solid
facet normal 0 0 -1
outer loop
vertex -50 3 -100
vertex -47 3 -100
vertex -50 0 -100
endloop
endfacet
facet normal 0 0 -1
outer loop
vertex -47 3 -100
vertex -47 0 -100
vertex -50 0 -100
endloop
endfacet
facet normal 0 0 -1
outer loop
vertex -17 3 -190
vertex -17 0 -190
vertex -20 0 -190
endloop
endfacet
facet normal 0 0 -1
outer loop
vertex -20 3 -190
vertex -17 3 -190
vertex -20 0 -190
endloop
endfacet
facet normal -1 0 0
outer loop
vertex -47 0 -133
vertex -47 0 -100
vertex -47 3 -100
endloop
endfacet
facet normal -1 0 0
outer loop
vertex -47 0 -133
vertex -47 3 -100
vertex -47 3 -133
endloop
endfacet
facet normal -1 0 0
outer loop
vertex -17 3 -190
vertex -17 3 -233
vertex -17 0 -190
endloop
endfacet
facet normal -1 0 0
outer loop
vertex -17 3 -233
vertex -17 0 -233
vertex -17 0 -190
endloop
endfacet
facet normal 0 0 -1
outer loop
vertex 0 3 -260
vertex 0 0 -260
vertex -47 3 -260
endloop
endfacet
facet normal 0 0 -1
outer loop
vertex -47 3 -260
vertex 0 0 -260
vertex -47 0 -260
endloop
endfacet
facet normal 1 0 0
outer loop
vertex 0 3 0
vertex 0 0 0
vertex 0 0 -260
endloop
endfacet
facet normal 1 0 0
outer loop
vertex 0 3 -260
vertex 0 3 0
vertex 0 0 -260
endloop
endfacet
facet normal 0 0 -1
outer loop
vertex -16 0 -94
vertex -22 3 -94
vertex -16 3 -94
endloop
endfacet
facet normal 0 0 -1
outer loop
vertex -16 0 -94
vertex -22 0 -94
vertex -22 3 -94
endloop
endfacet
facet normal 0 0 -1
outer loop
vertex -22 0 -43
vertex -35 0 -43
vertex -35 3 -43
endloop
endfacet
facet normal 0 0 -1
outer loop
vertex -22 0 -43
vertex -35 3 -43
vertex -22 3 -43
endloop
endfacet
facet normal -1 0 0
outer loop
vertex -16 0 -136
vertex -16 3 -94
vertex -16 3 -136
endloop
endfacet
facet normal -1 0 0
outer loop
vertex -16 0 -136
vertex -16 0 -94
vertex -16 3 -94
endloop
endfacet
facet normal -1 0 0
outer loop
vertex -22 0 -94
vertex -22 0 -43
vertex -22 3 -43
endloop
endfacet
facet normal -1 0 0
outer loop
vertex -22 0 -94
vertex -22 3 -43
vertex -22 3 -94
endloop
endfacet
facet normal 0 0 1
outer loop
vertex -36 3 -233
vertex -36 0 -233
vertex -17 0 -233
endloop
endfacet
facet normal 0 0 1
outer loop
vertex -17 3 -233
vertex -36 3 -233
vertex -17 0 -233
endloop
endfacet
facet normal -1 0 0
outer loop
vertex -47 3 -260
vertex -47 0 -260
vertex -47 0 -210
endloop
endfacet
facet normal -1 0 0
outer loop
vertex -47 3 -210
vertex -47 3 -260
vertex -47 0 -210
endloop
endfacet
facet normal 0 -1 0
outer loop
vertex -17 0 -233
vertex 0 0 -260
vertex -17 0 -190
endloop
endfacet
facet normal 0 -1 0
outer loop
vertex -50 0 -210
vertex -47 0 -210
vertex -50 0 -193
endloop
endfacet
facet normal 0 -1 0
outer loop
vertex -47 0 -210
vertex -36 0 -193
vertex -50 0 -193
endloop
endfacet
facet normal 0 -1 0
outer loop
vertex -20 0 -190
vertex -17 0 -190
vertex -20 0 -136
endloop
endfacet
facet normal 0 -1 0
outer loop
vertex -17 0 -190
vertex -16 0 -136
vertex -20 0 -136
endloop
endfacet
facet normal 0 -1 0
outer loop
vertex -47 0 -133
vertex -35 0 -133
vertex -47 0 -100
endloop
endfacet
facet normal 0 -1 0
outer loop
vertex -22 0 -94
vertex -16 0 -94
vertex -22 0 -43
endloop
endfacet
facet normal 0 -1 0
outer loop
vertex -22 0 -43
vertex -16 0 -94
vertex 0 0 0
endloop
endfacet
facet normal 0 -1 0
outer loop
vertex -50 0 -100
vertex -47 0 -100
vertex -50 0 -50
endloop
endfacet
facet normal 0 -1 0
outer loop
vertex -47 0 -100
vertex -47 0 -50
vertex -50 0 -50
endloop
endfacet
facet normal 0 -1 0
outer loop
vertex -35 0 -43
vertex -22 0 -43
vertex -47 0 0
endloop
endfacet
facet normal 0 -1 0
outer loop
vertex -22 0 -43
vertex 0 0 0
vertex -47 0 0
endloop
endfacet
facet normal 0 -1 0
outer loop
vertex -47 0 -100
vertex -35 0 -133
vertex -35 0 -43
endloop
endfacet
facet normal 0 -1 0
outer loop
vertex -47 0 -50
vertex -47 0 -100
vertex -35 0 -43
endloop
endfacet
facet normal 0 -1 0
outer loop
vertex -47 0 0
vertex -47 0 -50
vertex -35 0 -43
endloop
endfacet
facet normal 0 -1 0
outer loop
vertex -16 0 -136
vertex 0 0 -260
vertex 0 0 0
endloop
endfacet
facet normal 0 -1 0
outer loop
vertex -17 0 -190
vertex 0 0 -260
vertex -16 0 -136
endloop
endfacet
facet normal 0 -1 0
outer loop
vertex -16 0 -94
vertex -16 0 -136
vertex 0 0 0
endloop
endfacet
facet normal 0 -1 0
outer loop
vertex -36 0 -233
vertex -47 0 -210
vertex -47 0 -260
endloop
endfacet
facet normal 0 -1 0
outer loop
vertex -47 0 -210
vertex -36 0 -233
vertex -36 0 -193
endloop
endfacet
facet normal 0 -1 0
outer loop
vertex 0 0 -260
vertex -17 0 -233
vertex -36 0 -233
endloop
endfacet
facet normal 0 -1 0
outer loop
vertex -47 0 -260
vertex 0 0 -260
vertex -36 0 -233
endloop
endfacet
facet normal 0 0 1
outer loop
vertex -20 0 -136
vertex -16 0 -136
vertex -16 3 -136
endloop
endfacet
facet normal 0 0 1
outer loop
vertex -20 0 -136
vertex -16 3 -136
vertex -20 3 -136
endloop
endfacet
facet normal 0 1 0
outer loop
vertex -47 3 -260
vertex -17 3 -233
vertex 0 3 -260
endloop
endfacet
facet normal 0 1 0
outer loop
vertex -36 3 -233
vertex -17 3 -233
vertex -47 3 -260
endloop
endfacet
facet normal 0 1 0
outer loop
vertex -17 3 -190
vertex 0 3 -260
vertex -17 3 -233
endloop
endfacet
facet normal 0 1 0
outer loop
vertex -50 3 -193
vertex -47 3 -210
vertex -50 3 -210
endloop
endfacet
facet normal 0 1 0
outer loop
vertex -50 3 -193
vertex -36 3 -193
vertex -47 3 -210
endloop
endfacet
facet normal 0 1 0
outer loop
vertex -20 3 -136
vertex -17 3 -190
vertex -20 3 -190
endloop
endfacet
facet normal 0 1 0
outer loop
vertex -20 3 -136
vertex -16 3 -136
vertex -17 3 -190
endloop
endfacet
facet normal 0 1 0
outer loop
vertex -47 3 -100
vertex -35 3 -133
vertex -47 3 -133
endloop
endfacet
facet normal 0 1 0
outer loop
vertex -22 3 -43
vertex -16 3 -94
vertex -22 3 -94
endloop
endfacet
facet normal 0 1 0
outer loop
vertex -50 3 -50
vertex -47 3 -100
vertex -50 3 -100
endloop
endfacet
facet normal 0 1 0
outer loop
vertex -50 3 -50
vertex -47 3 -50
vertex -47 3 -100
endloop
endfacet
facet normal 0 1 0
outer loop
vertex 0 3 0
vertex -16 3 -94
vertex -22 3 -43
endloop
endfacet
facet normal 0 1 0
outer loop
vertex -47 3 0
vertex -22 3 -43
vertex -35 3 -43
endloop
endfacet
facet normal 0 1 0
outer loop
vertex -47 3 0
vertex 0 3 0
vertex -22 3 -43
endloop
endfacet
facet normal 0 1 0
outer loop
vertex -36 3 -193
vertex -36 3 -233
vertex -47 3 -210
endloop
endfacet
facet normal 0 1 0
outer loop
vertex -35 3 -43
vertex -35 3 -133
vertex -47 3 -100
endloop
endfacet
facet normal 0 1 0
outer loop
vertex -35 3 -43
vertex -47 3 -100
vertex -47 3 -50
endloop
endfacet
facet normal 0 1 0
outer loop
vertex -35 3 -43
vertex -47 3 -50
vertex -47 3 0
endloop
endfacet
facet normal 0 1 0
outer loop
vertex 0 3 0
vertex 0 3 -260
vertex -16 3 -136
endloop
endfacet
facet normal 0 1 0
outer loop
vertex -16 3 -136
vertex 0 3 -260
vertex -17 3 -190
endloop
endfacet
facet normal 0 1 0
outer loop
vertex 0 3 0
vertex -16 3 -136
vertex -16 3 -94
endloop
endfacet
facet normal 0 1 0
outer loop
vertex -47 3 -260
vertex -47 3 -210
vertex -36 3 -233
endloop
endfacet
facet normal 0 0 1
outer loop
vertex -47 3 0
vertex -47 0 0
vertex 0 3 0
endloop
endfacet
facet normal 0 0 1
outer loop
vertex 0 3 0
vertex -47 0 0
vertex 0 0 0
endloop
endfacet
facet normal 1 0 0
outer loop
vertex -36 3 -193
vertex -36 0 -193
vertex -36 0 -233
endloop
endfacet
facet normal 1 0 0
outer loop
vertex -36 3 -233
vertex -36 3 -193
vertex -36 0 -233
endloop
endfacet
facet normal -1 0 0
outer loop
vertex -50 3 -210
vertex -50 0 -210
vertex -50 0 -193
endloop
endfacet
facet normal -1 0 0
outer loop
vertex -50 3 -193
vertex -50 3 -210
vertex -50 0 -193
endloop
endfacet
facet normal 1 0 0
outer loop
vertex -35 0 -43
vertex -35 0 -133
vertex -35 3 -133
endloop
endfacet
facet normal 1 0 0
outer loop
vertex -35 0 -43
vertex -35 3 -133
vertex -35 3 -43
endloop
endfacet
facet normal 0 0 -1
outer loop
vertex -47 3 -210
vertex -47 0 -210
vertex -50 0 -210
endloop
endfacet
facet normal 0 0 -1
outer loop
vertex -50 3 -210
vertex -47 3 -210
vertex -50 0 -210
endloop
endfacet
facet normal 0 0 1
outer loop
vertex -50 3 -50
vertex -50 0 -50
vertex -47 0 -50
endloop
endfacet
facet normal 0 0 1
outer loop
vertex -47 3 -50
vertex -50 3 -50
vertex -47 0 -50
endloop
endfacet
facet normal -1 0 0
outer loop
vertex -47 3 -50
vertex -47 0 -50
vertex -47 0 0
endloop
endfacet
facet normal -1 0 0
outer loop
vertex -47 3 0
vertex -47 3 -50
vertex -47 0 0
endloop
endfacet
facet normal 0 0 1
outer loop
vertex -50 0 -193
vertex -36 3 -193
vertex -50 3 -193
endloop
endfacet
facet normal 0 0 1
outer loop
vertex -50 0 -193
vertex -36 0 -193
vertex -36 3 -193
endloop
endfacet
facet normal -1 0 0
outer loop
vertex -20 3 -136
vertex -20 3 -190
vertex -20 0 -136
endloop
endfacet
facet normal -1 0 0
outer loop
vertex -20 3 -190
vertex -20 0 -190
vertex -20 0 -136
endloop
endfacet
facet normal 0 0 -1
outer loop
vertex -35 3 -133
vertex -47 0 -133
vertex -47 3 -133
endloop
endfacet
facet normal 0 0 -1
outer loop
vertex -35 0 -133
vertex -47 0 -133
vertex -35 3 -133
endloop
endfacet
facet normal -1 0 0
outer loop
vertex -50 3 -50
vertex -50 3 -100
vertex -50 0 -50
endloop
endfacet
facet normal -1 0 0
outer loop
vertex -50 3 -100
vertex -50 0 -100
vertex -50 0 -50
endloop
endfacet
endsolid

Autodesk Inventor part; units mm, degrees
ref_plane "YZ Plane" through (0, 0, 0) normal (1, 0, 0) x (0, 1, 0)
ref_plane "XZ Plane" through (0, 0, 0) normal (0, 1, 0) x (-1, 0, 0)
ref_plane "XY Plane" through (0, 0, 0) normal (0, 0, 1) x (1, 0, 0)
sketch "Sketch1" plane through (0, 0, 0) normal (0, 1, 0) x (-1, 0, 0)
  line L0 (0, 0) -> (0, -260)
  line L1 (0, -260) -> (47, -260)
  line L2 (47, -260) -> (47, -210)
  line L3 (47, -210) -> (50, -210)
  line L4 (47, -100) -> (50, -100)
  line L5 (50, -100) -> (50, -50)
  line L6 (50, -50) -> (47, -50)
  line L7 (47, -50) -> (47, 0)
  line L8 (47, 0) -> (0, 0)
  line L9 (47, -260) -> (50, -260) construction
  line L10 (47, -100) -> (47, -133)
  line L11 (47, -260) -> (36, -260) construction
  line L12 (36, -233) -> (17, -233)
  line L13 (17, -233) -> (17, -190)
  line L14 (17, -190) -> (20, -190)
  line L15 (47, -133) -> (35, -133) construction
  line L16 (35, -133) -> (35, -43)
  line L17 (35, -43) -> (22, -43)
  line L18 (22, -43) -> (22, -94)
  line L19 (22, -94) -> (16, -94)
  line L20 (16, -94) -> (16, -136)
  line L21 (16, -136) -> (20, -136)
  line L22 (20, -190) -> (20, -136)
  line L23 (47, -133) -> (35, -133)
  line L24 (50, -210) -> (50, -193)
  line L25 (36, -193) -> (50, -193)
  line L26 (36, -193) -> (36, -233)
  dimension "d0" = 260
  dimension "d1" = 47
  dimension "d2" = 50
  dimension "d3" = 3
  dimension "d6" = 50
  dimension "d10" = 11
  dimension "d14" = 19
  dimension "d15" = 12
  dimension "d16" = 90
  dimension "d17" = 13
  dimension "d18" = 51
  dimension "d19" = 6
  dimension "d20" = 42
  dimension "d24" = 67
  dimension "d25" = 60
extrude "Extrusion1" add sketch "Sketch1" along normal blind 3
properties part number "Atas Terminal"
